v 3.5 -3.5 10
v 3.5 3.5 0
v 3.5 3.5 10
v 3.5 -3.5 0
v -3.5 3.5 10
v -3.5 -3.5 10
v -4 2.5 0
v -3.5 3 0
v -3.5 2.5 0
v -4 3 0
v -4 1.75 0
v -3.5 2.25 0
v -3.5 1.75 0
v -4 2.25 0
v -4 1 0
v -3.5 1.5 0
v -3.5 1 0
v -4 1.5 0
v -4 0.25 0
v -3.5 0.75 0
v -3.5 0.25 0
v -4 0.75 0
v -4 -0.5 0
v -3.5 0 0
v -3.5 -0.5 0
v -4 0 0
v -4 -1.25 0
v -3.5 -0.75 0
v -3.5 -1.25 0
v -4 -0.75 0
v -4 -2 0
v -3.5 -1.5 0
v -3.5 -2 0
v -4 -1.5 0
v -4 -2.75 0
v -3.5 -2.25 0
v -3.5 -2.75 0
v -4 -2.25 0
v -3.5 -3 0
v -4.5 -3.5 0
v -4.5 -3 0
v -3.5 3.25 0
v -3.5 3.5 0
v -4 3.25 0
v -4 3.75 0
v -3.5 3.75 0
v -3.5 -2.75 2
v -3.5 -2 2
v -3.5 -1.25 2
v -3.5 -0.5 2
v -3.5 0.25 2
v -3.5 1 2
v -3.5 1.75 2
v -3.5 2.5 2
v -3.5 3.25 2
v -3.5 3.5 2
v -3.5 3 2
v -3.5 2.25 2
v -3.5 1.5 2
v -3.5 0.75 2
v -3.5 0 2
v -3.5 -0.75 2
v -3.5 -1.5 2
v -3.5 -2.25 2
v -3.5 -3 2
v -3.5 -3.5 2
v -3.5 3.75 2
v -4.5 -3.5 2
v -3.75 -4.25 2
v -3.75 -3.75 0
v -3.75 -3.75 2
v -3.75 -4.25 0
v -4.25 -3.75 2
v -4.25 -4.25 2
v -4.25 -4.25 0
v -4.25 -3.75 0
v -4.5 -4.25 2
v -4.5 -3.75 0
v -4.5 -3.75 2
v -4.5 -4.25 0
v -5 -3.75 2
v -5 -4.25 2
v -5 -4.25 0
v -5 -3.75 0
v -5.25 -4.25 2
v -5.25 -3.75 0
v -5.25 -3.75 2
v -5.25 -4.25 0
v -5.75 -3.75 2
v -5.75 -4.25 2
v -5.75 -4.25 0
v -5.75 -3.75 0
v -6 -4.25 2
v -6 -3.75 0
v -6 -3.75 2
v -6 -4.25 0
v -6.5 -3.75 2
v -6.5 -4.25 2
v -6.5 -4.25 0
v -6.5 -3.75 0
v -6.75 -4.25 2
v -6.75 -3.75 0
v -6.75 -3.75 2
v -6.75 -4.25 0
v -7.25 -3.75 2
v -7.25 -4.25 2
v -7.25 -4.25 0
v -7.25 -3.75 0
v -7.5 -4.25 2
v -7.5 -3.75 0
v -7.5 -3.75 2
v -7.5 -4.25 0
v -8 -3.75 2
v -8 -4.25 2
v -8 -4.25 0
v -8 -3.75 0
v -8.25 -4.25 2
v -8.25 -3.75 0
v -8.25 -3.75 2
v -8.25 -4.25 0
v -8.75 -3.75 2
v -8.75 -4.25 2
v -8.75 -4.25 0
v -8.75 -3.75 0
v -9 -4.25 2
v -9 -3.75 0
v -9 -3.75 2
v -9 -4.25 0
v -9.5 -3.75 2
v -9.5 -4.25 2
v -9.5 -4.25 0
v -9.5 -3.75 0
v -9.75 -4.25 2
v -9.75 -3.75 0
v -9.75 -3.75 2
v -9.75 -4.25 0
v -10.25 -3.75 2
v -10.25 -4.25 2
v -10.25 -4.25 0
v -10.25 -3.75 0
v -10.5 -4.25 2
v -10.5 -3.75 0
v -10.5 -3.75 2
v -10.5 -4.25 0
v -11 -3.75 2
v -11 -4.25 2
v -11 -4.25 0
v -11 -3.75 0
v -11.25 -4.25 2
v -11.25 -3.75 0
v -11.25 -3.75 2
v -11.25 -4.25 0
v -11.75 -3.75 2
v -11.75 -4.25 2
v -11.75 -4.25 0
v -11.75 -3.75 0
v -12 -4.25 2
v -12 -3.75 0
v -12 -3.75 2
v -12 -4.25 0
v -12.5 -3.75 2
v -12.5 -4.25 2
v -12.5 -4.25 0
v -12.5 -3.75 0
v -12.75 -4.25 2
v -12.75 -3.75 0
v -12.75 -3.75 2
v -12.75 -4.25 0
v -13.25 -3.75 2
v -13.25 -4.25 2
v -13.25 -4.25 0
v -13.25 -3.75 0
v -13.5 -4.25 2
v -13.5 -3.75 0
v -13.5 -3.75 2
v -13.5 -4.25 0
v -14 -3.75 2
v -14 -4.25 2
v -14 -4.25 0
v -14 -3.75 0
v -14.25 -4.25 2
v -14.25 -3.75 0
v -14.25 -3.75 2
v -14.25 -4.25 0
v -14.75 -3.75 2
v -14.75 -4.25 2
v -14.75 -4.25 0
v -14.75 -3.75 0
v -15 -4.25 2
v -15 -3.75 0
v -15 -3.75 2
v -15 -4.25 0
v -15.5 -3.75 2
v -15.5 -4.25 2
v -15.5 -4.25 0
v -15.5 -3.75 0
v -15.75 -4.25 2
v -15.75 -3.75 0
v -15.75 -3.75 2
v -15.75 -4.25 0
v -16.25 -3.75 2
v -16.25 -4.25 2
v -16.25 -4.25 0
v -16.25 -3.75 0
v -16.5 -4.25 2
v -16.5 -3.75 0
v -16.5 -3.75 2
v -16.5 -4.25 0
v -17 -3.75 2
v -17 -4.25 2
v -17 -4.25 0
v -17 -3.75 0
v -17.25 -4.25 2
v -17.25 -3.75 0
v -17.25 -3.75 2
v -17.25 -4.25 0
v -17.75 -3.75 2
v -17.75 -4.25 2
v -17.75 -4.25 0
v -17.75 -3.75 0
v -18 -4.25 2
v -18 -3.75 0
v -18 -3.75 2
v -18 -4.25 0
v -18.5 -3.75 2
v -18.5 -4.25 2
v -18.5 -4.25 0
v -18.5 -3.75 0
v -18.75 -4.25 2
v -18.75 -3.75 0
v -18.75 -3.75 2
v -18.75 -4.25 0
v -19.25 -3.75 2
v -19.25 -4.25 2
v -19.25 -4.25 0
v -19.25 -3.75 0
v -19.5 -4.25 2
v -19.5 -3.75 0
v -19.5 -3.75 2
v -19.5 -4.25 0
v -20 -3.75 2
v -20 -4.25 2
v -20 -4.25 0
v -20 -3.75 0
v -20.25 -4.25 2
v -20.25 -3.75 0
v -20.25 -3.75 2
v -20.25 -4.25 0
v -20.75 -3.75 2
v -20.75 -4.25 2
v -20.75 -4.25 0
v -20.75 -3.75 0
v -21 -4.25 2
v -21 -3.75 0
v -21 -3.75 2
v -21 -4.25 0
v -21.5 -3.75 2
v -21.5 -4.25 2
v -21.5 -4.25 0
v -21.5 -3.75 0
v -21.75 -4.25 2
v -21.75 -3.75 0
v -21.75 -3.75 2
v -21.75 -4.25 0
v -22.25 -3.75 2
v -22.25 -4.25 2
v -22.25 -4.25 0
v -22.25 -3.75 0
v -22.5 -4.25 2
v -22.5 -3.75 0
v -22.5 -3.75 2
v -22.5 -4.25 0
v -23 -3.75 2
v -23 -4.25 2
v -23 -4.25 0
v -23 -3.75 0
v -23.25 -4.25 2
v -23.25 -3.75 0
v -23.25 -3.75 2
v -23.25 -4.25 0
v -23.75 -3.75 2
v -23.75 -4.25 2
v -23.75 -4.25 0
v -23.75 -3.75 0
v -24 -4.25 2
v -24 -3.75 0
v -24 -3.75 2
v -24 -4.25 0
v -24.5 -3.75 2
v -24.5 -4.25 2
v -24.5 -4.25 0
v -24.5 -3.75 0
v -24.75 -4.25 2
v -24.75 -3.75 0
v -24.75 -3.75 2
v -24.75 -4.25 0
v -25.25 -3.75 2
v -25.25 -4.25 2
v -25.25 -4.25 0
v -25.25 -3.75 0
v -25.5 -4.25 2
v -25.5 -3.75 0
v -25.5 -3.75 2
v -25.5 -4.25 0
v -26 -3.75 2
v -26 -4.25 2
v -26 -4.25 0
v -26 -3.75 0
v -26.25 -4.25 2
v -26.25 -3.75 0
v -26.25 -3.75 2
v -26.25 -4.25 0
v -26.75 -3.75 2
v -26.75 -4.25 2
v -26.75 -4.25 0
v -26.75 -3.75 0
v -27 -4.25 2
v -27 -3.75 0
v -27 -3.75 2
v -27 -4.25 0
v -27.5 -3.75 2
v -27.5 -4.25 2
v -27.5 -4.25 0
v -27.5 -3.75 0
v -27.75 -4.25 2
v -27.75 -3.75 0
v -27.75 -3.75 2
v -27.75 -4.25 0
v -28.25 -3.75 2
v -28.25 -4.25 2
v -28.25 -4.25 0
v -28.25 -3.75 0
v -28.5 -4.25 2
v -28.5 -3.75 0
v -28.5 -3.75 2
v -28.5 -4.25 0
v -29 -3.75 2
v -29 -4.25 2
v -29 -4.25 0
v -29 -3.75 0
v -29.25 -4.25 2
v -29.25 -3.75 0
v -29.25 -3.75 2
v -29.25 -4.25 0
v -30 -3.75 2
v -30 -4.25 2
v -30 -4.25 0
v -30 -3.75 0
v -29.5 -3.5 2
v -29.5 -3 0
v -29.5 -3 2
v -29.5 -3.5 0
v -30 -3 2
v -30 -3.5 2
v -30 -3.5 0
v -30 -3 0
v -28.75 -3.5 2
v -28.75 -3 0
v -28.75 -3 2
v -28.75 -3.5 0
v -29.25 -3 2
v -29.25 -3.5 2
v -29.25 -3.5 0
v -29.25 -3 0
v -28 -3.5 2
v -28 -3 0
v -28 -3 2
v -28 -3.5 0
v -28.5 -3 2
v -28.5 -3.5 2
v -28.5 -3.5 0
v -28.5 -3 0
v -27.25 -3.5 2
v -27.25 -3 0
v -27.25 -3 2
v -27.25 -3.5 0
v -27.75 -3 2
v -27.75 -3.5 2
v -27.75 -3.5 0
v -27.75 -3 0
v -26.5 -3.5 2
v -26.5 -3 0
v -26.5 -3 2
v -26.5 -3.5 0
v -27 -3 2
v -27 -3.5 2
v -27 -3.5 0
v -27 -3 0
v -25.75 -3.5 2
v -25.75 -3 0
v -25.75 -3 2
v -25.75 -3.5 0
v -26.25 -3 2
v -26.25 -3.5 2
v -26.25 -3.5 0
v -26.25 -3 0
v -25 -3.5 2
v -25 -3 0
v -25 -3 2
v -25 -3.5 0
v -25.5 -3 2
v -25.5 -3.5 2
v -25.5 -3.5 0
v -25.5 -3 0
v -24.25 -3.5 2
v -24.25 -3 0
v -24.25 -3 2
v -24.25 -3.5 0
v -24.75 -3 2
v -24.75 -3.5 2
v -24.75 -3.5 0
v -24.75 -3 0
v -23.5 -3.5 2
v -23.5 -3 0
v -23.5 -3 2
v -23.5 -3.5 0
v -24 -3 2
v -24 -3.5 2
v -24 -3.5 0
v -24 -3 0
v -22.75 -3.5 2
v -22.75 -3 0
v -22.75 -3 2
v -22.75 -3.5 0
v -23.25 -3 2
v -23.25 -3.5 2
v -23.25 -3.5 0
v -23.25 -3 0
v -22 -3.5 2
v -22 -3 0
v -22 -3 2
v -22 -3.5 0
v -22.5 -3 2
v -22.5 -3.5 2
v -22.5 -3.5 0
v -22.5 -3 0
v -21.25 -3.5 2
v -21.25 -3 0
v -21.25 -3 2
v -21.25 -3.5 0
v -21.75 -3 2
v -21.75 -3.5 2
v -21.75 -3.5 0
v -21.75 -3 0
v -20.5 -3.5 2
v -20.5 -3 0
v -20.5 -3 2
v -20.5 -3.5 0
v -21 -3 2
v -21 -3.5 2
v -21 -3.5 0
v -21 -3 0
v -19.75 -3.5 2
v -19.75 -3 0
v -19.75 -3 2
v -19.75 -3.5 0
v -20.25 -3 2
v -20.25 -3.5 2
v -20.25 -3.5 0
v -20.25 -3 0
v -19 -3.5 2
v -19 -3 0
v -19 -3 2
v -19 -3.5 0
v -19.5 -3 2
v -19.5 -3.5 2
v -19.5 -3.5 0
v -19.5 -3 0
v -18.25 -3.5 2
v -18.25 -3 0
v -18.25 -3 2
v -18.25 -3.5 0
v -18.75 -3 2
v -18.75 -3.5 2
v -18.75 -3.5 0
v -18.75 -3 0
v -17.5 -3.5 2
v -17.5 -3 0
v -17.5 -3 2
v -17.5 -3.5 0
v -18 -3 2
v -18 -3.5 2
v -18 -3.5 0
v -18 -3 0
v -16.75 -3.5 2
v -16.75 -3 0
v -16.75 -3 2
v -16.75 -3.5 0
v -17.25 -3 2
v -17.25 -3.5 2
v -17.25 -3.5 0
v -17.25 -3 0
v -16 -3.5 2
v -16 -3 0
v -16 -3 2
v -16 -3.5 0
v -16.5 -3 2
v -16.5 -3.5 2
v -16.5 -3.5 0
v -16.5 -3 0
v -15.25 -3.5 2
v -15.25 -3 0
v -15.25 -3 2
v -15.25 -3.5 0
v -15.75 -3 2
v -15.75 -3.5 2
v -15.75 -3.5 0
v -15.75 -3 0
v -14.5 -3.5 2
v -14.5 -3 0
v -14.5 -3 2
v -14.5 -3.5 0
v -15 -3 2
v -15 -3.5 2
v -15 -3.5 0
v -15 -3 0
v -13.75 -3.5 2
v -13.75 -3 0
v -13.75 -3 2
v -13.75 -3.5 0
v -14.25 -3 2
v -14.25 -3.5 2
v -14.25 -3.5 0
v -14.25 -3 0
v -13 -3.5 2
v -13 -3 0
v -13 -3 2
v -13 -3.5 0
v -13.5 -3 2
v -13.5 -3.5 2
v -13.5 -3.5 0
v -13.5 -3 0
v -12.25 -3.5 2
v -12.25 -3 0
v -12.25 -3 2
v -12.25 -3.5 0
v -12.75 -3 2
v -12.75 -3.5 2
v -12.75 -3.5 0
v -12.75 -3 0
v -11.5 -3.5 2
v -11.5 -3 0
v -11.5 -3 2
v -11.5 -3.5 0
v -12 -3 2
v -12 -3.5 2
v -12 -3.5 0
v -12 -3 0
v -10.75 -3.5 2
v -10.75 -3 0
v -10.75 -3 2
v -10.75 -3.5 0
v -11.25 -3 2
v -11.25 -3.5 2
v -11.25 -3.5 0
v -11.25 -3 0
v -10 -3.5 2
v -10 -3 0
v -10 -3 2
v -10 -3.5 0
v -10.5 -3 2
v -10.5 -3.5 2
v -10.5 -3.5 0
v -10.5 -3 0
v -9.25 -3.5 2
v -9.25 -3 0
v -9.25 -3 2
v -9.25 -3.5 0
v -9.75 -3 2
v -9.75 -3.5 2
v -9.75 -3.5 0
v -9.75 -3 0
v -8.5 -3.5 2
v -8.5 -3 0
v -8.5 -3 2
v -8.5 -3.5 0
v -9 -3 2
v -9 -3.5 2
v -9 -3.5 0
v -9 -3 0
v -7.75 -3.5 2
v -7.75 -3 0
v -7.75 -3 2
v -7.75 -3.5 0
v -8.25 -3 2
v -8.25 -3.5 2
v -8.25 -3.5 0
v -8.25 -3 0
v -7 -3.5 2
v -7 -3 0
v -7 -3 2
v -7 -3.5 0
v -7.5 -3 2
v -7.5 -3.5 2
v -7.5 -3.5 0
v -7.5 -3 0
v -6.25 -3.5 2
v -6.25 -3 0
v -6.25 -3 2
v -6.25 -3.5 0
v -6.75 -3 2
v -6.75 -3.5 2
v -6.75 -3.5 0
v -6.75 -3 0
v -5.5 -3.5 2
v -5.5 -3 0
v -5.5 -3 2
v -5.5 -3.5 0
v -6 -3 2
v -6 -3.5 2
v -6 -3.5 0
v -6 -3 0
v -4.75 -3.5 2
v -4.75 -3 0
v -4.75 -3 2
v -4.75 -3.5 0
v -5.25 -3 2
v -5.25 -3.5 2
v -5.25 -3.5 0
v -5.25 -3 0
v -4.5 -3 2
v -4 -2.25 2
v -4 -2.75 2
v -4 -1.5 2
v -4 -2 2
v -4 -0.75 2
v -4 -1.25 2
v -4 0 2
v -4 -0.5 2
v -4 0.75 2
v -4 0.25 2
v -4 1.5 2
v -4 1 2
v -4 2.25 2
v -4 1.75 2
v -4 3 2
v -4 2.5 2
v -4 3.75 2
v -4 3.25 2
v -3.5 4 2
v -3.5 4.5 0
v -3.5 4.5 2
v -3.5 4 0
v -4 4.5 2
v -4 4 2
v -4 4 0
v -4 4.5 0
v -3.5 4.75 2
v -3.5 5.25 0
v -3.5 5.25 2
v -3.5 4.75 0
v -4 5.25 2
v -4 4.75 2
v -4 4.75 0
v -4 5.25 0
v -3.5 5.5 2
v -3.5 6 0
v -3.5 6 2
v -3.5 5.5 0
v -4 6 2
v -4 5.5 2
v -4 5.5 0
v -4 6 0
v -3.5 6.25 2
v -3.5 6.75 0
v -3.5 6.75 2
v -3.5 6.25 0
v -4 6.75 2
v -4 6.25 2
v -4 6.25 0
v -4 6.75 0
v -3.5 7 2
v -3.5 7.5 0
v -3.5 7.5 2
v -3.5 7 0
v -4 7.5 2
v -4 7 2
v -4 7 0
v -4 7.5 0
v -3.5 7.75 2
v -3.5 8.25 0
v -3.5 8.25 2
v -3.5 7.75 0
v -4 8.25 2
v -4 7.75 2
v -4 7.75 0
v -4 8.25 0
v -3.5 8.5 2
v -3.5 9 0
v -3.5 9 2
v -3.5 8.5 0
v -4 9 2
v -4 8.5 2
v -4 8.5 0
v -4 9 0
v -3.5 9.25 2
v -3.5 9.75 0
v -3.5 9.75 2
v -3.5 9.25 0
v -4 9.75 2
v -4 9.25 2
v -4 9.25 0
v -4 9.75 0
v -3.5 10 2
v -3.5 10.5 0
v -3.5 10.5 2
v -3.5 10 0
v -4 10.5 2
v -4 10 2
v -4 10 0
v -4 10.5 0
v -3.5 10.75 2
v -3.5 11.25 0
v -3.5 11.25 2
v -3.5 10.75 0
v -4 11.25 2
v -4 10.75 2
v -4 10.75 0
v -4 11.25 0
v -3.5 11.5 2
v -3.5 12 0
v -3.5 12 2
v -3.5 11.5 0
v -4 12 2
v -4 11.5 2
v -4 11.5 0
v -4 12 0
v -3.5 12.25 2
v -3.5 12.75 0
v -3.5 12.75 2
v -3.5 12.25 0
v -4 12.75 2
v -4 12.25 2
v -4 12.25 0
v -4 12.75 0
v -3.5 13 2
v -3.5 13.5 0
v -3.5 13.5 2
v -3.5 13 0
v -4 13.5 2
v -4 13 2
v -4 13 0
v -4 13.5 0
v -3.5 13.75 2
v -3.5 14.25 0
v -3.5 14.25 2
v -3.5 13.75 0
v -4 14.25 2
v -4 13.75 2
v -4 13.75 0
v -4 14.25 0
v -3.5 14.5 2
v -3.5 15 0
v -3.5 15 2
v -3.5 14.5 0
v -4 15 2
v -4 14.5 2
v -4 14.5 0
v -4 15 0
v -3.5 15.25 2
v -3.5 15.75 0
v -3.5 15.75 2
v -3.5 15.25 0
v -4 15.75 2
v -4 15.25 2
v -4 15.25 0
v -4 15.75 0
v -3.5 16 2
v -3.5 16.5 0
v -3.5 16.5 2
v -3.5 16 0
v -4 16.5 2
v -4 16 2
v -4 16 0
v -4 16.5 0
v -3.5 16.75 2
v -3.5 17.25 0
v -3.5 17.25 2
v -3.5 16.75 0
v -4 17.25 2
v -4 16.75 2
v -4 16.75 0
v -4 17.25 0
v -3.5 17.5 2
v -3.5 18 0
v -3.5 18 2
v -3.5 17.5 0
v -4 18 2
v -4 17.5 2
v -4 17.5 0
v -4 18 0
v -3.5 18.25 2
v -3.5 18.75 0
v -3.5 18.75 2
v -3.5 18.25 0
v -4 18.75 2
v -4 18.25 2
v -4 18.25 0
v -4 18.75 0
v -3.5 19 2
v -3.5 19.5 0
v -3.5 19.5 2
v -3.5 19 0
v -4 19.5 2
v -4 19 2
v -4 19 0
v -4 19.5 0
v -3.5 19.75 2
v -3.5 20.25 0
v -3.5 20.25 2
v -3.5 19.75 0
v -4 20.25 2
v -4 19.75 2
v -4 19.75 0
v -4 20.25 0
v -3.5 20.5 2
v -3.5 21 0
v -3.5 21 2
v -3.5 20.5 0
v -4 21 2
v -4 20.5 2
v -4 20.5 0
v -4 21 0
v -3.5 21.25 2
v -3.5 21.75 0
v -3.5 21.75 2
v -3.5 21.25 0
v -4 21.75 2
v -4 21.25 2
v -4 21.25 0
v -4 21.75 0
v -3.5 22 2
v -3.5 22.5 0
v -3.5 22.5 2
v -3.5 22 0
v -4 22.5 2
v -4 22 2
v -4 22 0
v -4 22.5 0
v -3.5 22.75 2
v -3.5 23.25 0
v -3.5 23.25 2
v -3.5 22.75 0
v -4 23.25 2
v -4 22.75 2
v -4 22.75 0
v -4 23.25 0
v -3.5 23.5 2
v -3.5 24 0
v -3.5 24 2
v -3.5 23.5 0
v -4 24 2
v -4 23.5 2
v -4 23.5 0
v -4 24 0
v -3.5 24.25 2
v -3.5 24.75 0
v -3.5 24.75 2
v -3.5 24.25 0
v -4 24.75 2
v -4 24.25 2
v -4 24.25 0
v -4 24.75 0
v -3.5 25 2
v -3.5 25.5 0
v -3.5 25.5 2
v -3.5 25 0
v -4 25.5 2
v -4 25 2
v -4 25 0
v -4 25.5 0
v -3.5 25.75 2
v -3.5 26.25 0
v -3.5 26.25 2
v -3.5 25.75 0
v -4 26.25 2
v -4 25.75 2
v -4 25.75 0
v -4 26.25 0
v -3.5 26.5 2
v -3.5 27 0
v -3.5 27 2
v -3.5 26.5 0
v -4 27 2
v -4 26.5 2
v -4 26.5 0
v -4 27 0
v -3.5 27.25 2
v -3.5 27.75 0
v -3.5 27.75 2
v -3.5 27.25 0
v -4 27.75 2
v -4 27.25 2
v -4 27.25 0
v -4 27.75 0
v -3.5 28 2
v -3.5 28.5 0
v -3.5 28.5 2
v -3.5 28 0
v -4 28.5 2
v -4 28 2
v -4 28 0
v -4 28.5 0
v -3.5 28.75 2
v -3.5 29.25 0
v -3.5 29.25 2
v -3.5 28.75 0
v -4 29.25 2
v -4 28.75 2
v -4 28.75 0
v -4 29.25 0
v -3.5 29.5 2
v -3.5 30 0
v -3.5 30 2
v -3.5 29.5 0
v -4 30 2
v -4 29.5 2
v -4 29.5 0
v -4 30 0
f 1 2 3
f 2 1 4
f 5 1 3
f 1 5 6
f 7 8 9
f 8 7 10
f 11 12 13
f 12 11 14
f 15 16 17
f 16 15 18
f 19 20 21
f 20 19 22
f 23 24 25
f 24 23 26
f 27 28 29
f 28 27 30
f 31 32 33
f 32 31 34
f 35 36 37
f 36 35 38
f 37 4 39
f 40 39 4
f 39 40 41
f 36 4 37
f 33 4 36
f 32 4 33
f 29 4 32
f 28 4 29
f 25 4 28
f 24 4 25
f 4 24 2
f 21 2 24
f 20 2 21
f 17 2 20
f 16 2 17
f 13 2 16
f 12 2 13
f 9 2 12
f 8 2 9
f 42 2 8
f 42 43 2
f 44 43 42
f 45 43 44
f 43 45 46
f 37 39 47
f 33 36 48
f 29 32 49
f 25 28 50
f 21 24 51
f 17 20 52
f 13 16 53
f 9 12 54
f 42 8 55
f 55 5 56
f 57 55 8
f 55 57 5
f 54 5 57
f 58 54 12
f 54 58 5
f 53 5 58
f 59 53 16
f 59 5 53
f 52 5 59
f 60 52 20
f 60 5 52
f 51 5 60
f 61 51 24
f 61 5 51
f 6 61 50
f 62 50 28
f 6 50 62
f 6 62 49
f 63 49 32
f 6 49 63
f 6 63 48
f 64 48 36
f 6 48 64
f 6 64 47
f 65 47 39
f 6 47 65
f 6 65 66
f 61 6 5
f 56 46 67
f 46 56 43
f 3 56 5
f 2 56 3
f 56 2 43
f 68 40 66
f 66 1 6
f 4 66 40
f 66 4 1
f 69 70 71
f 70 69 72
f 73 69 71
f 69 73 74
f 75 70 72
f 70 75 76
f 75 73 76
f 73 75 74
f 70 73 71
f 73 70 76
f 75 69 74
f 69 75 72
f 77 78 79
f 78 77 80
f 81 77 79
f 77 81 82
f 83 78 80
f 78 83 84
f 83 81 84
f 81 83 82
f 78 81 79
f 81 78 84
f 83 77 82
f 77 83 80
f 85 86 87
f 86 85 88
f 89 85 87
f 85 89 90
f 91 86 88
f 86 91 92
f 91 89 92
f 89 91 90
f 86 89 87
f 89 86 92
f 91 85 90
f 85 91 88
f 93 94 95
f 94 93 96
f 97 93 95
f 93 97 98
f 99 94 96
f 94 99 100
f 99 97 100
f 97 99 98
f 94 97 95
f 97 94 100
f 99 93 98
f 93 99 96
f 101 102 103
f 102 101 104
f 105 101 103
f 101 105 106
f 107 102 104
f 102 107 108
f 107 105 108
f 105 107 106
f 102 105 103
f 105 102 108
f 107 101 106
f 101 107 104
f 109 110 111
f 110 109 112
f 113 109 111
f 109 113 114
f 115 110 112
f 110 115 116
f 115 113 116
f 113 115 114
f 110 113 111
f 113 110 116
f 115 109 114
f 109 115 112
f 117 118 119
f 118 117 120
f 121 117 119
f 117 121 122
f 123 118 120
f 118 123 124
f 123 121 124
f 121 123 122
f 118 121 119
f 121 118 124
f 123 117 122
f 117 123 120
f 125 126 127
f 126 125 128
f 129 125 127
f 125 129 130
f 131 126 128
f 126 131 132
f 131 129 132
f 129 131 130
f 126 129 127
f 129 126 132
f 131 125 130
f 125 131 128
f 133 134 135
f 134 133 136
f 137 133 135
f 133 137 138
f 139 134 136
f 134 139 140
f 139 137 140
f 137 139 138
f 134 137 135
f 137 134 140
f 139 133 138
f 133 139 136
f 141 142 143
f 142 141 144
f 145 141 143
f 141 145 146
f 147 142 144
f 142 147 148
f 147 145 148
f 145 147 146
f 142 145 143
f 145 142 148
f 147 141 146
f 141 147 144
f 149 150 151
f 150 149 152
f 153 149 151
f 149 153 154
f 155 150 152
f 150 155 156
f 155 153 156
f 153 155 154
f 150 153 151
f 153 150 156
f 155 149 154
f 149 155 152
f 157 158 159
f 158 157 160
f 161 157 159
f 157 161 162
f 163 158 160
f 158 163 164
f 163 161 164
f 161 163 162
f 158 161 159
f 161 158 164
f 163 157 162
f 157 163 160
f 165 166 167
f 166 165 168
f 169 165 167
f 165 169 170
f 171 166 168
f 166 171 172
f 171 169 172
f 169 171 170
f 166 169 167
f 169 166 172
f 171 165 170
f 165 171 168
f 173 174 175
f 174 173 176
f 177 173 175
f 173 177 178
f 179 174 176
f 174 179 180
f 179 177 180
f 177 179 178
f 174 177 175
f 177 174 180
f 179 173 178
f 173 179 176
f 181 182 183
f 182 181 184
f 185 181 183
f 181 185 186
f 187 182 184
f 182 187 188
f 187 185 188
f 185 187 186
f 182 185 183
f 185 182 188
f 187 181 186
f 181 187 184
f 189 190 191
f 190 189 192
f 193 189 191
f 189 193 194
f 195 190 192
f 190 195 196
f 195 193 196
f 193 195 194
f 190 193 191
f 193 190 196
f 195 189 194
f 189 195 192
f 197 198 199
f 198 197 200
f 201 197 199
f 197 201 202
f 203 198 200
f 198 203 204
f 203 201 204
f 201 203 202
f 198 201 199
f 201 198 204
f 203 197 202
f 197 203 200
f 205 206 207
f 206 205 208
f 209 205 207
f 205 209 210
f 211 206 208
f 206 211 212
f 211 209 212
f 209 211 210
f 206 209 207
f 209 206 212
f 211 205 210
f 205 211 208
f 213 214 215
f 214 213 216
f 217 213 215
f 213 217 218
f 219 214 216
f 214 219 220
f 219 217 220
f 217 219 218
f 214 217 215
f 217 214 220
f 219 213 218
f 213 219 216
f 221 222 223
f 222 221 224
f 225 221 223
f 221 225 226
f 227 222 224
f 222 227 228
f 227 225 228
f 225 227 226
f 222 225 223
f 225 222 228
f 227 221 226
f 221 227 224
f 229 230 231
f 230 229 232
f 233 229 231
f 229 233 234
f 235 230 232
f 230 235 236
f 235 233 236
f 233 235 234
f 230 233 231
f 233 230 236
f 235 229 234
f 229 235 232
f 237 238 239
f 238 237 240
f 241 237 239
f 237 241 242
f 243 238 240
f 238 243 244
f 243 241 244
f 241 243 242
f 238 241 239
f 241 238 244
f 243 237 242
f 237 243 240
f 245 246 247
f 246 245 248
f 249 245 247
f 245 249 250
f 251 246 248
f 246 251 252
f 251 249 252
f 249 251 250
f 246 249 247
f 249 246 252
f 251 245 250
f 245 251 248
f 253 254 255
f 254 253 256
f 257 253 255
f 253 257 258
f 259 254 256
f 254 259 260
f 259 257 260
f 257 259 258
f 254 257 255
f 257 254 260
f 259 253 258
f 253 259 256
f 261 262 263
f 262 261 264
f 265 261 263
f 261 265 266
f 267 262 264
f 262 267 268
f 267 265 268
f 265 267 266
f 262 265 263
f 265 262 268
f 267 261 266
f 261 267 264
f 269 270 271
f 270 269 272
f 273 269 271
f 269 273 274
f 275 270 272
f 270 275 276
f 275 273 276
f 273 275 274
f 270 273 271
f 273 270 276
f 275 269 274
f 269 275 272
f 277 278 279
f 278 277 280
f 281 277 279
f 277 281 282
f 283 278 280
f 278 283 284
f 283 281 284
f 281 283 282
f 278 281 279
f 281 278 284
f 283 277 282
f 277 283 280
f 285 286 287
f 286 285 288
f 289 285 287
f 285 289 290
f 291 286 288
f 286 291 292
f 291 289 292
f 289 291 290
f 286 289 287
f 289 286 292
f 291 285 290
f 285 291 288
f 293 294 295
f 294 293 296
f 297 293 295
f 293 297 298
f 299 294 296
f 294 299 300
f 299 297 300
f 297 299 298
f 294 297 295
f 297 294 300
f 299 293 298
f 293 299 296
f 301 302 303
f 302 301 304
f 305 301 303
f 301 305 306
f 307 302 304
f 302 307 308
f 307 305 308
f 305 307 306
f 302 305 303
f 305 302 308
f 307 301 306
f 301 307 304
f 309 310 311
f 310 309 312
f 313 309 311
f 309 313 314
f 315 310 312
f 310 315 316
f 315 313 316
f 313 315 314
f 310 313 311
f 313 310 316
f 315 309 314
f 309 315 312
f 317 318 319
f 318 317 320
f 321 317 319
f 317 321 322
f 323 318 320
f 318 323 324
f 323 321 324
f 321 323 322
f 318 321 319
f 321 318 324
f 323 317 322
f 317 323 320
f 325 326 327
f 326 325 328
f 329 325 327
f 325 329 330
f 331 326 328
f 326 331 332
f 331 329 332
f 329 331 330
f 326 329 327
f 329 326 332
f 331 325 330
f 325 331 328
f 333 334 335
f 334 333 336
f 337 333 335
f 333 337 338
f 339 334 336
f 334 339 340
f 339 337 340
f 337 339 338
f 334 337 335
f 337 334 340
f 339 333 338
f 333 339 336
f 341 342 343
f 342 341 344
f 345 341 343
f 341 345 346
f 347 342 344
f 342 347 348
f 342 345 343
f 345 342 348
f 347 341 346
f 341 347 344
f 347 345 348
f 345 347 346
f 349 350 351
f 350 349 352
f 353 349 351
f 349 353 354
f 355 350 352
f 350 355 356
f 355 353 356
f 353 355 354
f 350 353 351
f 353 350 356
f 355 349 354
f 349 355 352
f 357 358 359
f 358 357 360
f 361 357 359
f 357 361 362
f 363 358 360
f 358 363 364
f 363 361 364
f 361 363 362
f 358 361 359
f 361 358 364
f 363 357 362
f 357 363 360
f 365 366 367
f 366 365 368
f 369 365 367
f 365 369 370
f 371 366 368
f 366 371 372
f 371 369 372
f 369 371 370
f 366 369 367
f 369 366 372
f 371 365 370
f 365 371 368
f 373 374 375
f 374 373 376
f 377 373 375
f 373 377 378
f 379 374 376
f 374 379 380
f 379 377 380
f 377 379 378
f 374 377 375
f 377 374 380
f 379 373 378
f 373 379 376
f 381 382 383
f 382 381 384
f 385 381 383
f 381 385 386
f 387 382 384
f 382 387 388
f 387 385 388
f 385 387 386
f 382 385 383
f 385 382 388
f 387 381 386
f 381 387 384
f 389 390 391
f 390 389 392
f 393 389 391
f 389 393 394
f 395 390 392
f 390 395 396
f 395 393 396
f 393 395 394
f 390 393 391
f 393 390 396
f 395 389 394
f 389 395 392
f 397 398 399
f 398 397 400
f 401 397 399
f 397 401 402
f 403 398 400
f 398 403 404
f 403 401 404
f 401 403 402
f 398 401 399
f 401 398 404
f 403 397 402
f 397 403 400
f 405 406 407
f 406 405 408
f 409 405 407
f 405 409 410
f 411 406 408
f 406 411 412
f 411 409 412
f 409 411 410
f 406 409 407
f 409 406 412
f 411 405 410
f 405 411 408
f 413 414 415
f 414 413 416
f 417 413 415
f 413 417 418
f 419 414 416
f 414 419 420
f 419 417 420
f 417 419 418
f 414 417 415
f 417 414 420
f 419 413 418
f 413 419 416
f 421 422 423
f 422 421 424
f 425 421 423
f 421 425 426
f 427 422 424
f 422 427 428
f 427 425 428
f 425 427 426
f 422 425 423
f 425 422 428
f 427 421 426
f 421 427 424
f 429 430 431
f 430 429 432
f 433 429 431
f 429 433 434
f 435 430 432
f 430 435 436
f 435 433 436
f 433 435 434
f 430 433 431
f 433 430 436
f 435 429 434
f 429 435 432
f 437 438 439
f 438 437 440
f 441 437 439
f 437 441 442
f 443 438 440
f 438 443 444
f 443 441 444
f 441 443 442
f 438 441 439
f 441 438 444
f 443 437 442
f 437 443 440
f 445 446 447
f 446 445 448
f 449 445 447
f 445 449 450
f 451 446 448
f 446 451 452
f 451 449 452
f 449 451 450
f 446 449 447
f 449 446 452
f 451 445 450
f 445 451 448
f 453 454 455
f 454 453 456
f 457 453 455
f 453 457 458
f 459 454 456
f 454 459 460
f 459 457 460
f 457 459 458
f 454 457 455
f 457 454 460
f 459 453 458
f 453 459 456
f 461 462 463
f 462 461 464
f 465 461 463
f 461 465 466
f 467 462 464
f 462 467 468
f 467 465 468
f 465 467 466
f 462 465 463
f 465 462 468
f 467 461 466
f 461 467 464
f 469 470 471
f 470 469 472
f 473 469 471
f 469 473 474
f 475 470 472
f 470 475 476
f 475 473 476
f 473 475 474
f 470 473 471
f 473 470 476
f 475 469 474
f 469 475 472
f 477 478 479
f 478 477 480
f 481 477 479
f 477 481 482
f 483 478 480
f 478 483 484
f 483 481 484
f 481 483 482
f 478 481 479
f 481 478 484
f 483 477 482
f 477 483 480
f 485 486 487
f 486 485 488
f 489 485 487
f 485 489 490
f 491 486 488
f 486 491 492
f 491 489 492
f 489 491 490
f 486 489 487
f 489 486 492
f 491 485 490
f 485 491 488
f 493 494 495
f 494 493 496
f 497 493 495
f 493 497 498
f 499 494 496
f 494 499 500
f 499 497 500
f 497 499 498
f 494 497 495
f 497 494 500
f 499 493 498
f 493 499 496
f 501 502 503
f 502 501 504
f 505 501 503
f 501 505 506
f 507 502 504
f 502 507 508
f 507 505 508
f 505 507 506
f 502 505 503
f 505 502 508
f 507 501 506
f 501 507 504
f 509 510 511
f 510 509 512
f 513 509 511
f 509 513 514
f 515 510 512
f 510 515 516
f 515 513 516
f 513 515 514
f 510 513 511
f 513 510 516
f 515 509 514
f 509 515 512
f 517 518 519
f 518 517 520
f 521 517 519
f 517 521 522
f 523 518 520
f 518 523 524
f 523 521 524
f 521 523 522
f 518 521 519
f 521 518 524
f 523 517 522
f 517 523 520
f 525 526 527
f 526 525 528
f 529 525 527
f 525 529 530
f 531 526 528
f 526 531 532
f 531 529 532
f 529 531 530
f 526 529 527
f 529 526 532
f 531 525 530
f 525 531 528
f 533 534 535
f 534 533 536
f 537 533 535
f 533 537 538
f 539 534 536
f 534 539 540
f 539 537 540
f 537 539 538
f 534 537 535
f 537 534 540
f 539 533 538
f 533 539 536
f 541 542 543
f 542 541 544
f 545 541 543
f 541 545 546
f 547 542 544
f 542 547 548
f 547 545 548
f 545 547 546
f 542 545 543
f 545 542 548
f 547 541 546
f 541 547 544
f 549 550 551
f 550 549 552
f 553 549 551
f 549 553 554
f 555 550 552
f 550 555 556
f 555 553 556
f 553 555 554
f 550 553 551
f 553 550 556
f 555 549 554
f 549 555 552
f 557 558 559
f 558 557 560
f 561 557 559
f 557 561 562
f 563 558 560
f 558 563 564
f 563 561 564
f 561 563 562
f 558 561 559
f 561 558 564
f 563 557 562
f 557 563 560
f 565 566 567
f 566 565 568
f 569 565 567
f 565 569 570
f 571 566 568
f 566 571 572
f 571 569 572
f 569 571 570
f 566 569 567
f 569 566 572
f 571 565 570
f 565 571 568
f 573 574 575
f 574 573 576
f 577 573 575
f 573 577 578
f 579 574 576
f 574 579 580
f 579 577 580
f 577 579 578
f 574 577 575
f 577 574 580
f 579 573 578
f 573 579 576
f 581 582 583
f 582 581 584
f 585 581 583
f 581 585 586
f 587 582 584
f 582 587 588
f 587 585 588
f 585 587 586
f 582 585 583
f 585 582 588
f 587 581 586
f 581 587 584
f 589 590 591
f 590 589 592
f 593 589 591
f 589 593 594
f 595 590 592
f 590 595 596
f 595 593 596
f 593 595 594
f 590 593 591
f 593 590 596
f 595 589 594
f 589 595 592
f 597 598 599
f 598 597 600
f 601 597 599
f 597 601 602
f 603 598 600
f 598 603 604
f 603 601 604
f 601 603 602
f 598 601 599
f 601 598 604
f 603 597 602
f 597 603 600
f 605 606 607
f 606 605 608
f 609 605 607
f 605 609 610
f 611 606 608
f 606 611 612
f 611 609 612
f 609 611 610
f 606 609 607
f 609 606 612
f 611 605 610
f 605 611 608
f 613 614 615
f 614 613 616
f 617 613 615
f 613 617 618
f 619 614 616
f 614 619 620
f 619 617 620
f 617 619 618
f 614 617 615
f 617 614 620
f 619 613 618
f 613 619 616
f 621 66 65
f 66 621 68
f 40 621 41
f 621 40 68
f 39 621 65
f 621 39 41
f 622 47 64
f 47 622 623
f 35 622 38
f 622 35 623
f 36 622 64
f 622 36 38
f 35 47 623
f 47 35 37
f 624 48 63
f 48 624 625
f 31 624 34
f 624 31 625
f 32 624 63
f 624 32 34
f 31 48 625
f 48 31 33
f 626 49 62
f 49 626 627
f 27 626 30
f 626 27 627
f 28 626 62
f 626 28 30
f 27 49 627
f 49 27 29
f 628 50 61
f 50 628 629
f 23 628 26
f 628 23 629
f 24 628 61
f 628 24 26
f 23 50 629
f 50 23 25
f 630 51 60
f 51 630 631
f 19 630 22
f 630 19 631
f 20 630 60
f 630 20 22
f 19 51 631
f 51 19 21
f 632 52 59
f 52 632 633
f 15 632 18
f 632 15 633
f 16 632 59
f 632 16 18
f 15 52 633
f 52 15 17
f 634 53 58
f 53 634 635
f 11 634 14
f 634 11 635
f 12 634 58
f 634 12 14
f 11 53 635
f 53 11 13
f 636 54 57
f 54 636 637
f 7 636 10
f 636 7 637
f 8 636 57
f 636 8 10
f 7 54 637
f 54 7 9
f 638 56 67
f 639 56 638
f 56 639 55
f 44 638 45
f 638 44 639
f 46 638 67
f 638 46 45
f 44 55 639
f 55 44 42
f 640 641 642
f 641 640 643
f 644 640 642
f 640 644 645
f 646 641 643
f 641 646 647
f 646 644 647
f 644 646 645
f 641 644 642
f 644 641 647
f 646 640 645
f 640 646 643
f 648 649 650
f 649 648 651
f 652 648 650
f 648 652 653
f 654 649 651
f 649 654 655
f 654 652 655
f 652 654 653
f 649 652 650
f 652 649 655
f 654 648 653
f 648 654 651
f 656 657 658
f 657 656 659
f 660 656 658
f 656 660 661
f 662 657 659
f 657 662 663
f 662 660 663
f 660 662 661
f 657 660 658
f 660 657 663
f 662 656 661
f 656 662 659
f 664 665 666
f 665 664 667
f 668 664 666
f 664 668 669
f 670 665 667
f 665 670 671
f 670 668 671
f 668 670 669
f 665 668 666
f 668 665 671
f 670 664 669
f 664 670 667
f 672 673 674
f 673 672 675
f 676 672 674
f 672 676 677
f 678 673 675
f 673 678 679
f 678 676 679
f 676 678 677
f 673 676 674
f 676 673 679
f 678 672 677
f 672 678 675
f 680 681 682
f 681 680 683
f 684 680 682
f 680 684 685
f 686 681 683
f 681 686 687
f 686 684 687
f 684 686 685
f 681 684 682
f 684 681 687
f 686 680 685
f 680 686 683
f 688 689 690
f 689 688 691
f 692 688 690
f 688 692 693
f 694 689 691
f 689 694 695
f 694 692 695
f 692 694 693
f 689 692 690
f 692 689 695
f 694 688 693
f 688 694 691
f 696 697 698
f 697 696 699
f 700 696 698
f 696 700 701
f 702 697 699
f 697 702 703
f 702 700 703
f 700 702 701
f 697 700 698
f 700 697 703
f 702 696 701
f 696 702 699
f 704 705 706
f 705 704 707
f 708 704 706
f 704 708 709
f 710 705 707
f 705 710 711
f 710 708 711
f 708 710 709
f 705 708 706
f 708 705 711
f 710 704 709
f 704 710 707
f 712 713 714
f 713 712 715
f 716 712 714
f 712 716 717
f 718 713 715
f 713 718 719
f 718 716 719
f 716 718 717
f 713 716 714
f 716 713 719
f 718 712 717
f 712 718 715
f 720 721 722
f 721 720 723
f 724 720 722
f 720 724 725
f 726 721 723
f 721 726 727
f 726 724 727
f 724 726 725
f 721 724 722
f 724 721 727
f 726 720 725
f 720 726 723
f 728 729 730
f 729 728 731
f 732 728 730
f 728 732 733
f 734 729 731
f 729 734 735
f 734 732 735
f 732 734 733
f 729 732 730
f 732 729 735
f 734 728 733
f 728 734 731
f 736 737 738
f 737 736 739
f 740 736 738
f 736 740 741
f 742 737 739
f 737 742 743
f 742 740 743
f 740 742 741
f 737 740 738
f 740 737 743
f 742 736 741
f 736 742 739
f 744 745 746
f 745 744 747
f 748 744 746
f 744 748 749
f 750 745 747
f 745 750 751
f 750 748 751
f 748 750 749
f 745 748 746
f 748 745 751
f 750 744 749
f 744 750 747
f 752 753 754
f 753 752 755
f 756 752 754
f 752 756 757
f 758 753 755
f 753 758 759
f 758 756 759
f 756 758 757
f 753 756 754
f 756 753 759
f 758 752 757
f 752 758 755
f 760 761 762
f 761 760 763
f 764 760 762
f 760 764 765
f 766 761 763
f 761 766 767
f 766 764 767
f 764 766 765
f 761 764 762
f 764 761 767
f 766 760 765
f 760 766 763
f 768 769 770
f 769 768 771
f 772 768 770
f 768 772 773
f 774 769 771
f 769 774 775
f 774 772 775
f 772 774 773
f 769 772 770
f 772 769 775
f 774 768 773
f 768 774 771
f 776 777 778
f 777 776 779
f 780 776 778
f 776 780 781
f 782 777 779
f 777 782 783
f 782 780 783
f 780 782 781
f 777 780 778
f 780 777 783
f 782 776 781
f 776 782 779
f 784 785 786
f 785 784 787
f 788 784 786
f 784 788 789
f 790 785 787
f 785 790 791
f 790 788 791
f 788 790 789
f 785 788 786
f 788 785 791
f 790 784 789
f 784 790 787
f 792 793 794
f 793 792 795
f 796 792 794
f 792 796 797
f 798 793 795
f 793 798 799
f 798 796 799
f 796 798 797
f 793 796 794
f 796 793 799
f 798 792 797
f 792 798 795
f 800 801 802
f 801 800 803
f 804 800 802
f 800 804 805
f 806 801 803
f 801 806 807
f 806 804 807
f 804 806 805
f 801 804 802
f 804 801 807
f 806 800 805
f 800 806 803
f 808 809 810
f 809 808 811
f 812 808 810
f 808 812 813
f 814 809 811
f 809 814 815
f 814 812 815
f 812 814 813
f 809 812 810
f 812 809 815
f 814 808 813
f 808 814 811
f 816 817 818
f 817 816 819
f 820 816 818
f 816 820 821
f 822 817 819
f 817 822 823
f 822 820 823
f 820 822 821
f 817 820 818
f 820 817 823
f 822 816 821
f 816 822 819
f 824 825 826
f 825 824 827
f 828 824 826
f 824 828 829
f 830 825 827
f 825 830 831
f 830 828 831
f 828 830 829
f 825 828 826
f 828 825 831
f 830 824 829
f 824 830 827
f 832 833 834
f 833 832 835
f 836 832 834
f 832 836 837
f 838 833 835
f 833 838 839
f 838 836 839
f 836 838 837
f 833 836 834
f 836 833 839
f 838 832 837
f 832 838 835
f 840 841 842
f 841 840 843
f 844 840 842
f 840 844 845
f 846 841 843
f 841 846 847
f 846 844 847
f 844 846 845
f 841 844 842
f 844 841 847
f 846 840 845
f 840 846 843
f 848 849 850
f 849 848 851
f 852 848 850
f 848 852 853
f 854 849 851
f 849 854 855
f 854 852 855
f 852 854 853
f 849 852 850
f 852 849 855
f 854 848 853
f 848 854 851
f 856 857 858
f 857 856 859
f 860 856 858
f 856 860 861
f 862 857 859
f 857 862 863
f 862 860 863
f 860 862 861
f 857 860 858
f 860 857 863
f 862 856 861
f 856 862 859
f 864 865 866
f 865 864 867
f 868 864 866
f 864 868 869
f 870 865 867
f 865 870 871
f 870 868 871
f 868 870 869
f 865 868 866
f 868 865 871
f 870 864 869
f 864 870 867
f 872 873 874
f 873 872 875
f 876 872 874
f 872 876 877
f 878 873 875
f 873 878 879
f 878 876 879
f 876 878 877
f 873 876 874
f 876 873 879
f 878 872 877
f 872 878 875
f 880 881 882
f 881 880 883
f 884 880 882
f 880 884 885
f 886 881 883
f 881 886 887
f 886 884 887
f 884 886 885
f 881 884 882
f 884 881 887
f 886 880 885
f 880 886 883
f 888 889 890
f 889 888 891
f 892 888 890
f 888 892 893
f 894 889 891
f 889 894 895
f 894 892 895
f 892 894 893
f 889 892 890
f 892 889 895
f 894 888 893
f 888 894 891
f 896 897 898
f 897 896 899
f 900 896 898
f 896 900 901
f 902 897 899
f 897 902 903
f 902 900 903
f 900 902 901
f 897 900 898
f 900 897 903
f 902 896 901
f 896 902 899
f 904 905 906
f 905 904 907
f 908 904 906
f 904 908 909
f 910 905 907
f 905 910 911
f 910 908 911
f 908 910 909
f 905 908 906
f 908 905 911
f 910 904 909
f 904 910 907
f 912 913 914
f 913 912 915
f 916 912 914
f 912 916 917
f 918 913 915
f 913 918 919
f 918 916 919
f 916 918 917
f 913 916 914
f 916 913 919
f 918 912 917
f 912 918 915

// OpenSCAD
translate([0, 0, 5]) color([0,1,0,0.9]) cube([7, 7, 10], center=true);
translate([-4.0, -4.0, 1]) color([1,0,0]) cube([0.5, 0.5, 2], center=true);
translate([-4.75, -4.0, 1]) color([1,0,0]) cube([0.5, 0.5, 2], center=true);
translate([-5.5, -4.0, 1]) color([1,0,0]) cube([0.5, 0.5, 2], center=true);
translate([-6.25, -4.0, 1]) color([1,0,0]) cube([0.5, 0.5, 2], center=true);
translate([-7.0, -4.0, 1]) color([1,0,0]) cube([0.5, 0.5, 2], center=true);
translate([-7.75, -4.0, 1]) color([1,0,0]) cube([0.5, 0.5, 2], center=true);
translate([-8.5, -4.0, 1]) color([1,0,0]) cube([0.5, 0.5, 2], center=true);
translate([-9.25, -4.0, 1]) color([1,0,0]) cube([0.5, 0.5, 2], center=true);
translate([-10.0, -4.0, 1]) color([1,0,0]) cube([0.5, 0.5, 2], center=true);
translate([-10.75, -4.0, 1]) color([1,0,0]) cube([0.5, 0.5, 2], center=true);
translate([-11.5, -4.0, 1]) color([1,0,0]) cube([0.5, 0.5, 2], center=true);
translate([-12.25, -4.0, 1]) color([1,0,0]) cube([0.5, 0.5, 2], center=true);
translate([-13.0, -4.0, 1]) color([1,0,0]) cube([0.5, 0.5, 2], center=true);
translate([-13.75, -4.0, 1]) color([1,0,0]) cube([0.5, 0.5, 2], center=true);
translate([-14.5, -4.0, 1]) color([1,0,0]) cube([0.5, 0.5, 2], center=true);
translate([-15.25, -4.0, 1]) color([1,0,0]) cube([0.5, 0.5, 2], center=true);
translate([-16.0, -4.0, 1]) color([1,0,0]) cube([0.5, 0.5, 2], center=true);
translate([-16.75, -4.0, 1]) color([1,0,0]) cube([0.5, 0.5, 2], center=true);
translate([-17.5, -4.0, 1]) color([1,0,0]) cube([0.5, 0.5, 2], center=true);
translate([-18.25, -4.0, 1]) color([1,0,0]) cube([0.5, 0.5, 2], center=true);
translate([-19.0, -4.0, 1]) color([1,0,0]) cube([0.5, 0.5, 2], center=true);
translate([-19.75, -4.0, 1]) color([1,0,0]) cube([0.5, 0.5, 2], center=true);
translate([-20.5, -4.0, 1]) color([1,0,0]) cube([0.5, 0.5, 2], center=true);
translate([-21.25, -4.0, 1]) color([1,0,0]) cube([0.5, 0.5, 2], center=true);
translate([-22.0, -4.0, 1]) color([1,0,0]) cube([0.5, 0.5, 2], center=true);
translate([-22.75, -4.0, 1]) color([1,0,0]) cube([0.5, 0.5, 2], center=true);
translate([-23.5, -4.0, 1]) color([1,0,0]) cube([0.5, 0.5, 2], center=true);
translate([-24.25, -4.0, 1]) color([1,0,0]) cube([0.5, 0.5, 2], center=true);
translate([-25.0, -4.0, 1]) color([1,0,0]) cube([0.5, 0.5, 2], center=true);
translate([-25.75, -4.0, 1]) color([1,0,0]) cube([0.5, 0.5, 2], center=true);
translate([-26.5, -4.0, 1]) color([1,0,0]) cube([0.5, 0.5, 2], center=true);
translate([-27.25, -4.0, 1]) color([1,0,0]) cube([0.5, 0.5, 2], center=true);
translate([-28.0, -4.0, 1]) color([1,0,0]) cube([0.5, 0.5, 2], center=true);
translate([-28.75, -4.0, 1]) color([1,0,0]) cube([0.5, 0.5, 2], center=true);
translate([-29.5, -4.0, 1]) color([1,0,0]) cube([0.5, 0.5, 2], center=true);
translate([-29.75, -4.0, 1]) color([1,0,0]) cube([0.5, 0.5, 2], center=true);
translate([-29.75, -3.25, 1]) color([1,0,0]) cube([0.5, 0.5, 2], center=true);
translate([-29.0, -3.25, 1]) color([1,0,0]) cube([0.5, 0.5, 2], center=true);
translate([-28.25, -3.25, 1]) color([1,0,0]) cube([0.5, 0.5, 2], center=true);
translate([-27.5, -3.25, 1]) color([1,0,0]) cube([0.5, 0.5, 2], center=true);
translate([-26.75, -3.25, 1]) color([1,0,0]) cube([0.5, 0.5, 2], center=true);
translate([-26.0, -3.25, 1]) color([1,0,0]) cube([0.5, 0.5, 2], center=true);
translate([-25.25, -3.25, 1]) color([1,0,0]) cube([0.5, 0.5, 2], center=true);
translate([-24.5, -3.25, 1]) color([1,0,0]) cube([0.5, 0.5, 2], center=true);
translate([-23.75, -3.25, 1]) color([1,0,0]) cube([0.5, 0.5, 2], center=true);
translate([-23.0, -3.25, 1]) color([1,0,0]) cube([0.5, 0.5, 2], center=true);
translate([-22.25, -3.25, 1]) color([1,0,0]) cube([0.5, 0.5, 2], center=true);
translate([-21.5, -3.25, 1]) color([1,0,0]) cube([0.5, 0.5, 2], center=true);
translate([-20.75, -3.25, 1]) color([1,0,0]) cube([0.5, 0.5, 2], center=true);
translate([-20.0, -3.25, 1]) color([1,0,0]) cube([0.5, 0.5, 2], center=true);
translate([-19.25, -3.25, 1]) color([1,0,0]) cube([0.5, 0.5, 2], center=true);
translate([-18.5, -3.25, 1]) color([1,0,0]) cube([0.5, 0.5, 2], center=true);
translate([-17.75, -3.25, 1]) color([1,0,0]) cube([0.5, 0.5, 2], center=true);
translate([-17.0, -3.25, 1]) color([1,0,0]) cube([0.5, 0.5, 2], center=true);
translate([-16.25, -3.25, 1]) color([1,0,0]) cube([0.5, 0.5, 2], center=true);
translate([-15.5, -3.25, 1]) color([1,0,0]) cube([0.5, 0.5, 2], center=true);
translate([-14.75, -3.25, 1]) color([1,0,0]) cube([0.5, 0.5, 2], center=true);
translate([-14.0, -3.25, 1]) color([1,0,0]) cube([0.5, 0.5, 2], center=true);
translate([-13.25, -3.25, 1]) color([1,0,0]) cube([0.5, 0.5, 2], center=true);
translate([-12.5, -3.25, 1]) color([1,0,0]) cube([0.5, 0.5, 2], center=true);
translate([-11.75, -3.25, 1]) color([1,0,0]) cube([0.5, 0.5, 2], center=true);
translate([-11.0, -3.25, 1]) color([1,0,0]) cube([0.5, 0.5, 2], center=true);
translate([-10.25, -3.25, 1]) color([1,0,0]) cube([0.5, 0.5, 2], center=true);
translate([-9.5, -3.25, 1]) color([1,0,0]) cube([0.5, 0.5, 2], center=true);
translate([-8.75, -3.25, 1]) color([1,0,0]) cube([0.5, 0.5, 2], center=true);
translate([-8.0, -3.25, 1]) color([1,0,0]) cube([0.5, 0.5, 2], center=true);
translate([-7.25, -3.25, 1]) color([1,0,0]) cube([0.5, 0.5, 2], center=true);
translate([-6.5, -3.25, 1]) color([1,0,0]) cube([0.5, 0.5, 2], center=true);
translate([-5.75, -3.25, 1]) color([1,0,0]) cube([0.5, 0.5, 2], center=true);
translate([-5.0, -3.25, 1]) color([1,0,0]) cube([0.5, 0.5, 2], center=true);
translate([-4.25, -3.25, 1]) color([1,0,0]) cube([0.5, 0.5, 2], center=true);
translate([-3.75, -3.25, 1]) color([1,0,0]) cube([0.5, 0.5, 2], center=true);
translate([-3.75, -2.5, 1]) color([1,0,0]) cube([0.5, 0.5, 2], center=true);
translate([-3.75, -1.75, 1]) color([1,0,0]) cube([0.5, 0.5, 2], center=true);
translate([-3.75, -1.0, 1]) color([1,0,0]) cube([0.5, 0.5, 2], center=true);
translate([-3.75, -0.25, 1]) color([1,0,0]) cube([0.5, 0.5, 2], center=true);
translate([-3.75, 0.5, 1]) color([1,0,0]) cube([0.5, 0.5, 2], center=true);
translate([-3.75, 1.25, 1]) color([1,0,0]) cube([0.5, 0.5, 2], center=true);
translate([-3.75, 2.0, 1]) color([1,0,0]) cube([0.5, 0.5, 2], center=true);
translate([-3.75, 2.75, 1]) color([1,0,0]) cube([0.5, 0.5, 2], center=true);
translate([-3.75, 3.5, 1]) color([1,0,0]) cube([0.5, 0.5, 2], center=true);
translate([-3.75, 4.25, 1]) color([1,0,0]) cube([0.5, 0.5, 2], center=true);
translate([-3.75, 5.0, 1]) color([1,0,0]) cube([0.5, 0.5, 2], center=true);
translate([-3.75, 5.75, 1]) color([1,0,0]) cube([0.5, 0.5, 2], center=true);
translate([-3.75, 6.5, 1]) color([1,0,0]) cube([0.5, 0.5, 2], center=true);
translate([-3.75, 7.25, 1]) color([1,0,0]) cube([0.5, 0.5, 2], center=true);
translate([-3.75, 8.0, 1]) color([1,0,0]) cube([0.5, 0.5, 2], center=true);
translate([-3.75, 8.75, 1]) color([1,0,0]) cube([0.5, 0.5, 2], center=true);
translate([-3.75, 9.5, 1]) color([1,0,0]) cube([0.5, 0.5, 2], center=true);
translate([-3.75, 10.25, 1]) color([1,0,0]) cube([0.5, 0.5, 2], center=true);
translate([-3.75, 11.0, 1]) color([1,0,0]) cube([0.5, 0.5, 2], center=true);
translate([-3.75, 11.75, 1]) color([1,0,0]) cube([0.5, 0.5, 2], center=true);
translate([-3.75, 12.5, 1]) color([1,0,0]) cube([0.5, 0.5, 2], center=true);
translate([-3.75, 13.25, 1]) color([1,0,0]) cube([0.5, 0.5, 2], center=true);
translate([-3.75, 14.0, 1]) color([1,0,0]) cube([0.5, 0.5, 2], center=true);
translate([-3.75, 14.75, 1]) color([1,0,0]) cube([0.5, 0.5, 2], center=true);
translate([-3.75, 15.5, 1]) color([1,0,0]) cube([0.5, 0.5, 2], center=true);
translate([-3.75, 16.25, 1]) color([1,0,0]) cube([0.5, 0.5, 2], center=true);
translate([-3.75, 17.0, 1]) color([1,0,0]) cube([0.5, 0.5, 2], center=true);
translate([-3.75, 17.75, 1]) color([1,0,0]) cube([0.5, 0.5, 2], center=true);
translate([-3.75, 18.5, 1]) color([1,0,0]) cube([0.5, 0.5, 2], center=true);
translate([-3.75, 19.25, 1]) color([1,0,0]) cube([0.5, 0.5, 2], center=true);
translate([-3.75, 20.0, 1]) color([1,0,0]) cube([0.5, 0.5, 2], center=true);
translate([-3.75, 20.75, 1]) color([1,0,0]) cube([0.5, 0.5, 2], center=true);
translate([-3.75, 21.5, 1]) color([1,0,0]) cube([0.5, 0.5, 2], center=true);
translate([-3.75, 22.25, 1]) color([1,0,0]) cube([0.5, 0.5, 2], center=true);
translate([-3.75, 23.0, 1]) color([1,0,0]) cube([0.5, 0.5, 2], center=true);
translate([-3.75, 23.75, 1]) color([1,0,0]) cube([0.5, 0.5, 2], center=true);
translate([-3.75, 24.5, 1]) color([1,0,0]) cube([0.5, 0.5, 2], center=true);
translate([-3.75, 25.25, 1]) color([1,0,0]) cube([0.5, 0.5, 2], center=true);
translate([-3.75, 26.0, 1]) color([1,0,0]) cube([0.5, 0.5, 2], center=true);
translate([-3.75, 26.75, 1]) color([1,0,0]) cube([0.5, 0.5, 2], center=true);
translate([-3.75, 27.5, 1]) color([1,0,0]) cube([0.5, 0.5, 2], center=true);
translate([-3.75, 28.25, 1]) color([1,0,0]) cube([0.5, 0.5, 2], center=true);
translate([-3.75, 29.0, 1]) color([1,0,0]) cube([0.5, 0.5, 2], center=true);
translate([-3.75, 29.75, 1]) color([1,0,0]) cube([0.5, 0.5, 2], center=true);
translate([-3.75, 29.75, 1]) color([1,0,0]) cube([0.5, 0.5, 2], center=true);
